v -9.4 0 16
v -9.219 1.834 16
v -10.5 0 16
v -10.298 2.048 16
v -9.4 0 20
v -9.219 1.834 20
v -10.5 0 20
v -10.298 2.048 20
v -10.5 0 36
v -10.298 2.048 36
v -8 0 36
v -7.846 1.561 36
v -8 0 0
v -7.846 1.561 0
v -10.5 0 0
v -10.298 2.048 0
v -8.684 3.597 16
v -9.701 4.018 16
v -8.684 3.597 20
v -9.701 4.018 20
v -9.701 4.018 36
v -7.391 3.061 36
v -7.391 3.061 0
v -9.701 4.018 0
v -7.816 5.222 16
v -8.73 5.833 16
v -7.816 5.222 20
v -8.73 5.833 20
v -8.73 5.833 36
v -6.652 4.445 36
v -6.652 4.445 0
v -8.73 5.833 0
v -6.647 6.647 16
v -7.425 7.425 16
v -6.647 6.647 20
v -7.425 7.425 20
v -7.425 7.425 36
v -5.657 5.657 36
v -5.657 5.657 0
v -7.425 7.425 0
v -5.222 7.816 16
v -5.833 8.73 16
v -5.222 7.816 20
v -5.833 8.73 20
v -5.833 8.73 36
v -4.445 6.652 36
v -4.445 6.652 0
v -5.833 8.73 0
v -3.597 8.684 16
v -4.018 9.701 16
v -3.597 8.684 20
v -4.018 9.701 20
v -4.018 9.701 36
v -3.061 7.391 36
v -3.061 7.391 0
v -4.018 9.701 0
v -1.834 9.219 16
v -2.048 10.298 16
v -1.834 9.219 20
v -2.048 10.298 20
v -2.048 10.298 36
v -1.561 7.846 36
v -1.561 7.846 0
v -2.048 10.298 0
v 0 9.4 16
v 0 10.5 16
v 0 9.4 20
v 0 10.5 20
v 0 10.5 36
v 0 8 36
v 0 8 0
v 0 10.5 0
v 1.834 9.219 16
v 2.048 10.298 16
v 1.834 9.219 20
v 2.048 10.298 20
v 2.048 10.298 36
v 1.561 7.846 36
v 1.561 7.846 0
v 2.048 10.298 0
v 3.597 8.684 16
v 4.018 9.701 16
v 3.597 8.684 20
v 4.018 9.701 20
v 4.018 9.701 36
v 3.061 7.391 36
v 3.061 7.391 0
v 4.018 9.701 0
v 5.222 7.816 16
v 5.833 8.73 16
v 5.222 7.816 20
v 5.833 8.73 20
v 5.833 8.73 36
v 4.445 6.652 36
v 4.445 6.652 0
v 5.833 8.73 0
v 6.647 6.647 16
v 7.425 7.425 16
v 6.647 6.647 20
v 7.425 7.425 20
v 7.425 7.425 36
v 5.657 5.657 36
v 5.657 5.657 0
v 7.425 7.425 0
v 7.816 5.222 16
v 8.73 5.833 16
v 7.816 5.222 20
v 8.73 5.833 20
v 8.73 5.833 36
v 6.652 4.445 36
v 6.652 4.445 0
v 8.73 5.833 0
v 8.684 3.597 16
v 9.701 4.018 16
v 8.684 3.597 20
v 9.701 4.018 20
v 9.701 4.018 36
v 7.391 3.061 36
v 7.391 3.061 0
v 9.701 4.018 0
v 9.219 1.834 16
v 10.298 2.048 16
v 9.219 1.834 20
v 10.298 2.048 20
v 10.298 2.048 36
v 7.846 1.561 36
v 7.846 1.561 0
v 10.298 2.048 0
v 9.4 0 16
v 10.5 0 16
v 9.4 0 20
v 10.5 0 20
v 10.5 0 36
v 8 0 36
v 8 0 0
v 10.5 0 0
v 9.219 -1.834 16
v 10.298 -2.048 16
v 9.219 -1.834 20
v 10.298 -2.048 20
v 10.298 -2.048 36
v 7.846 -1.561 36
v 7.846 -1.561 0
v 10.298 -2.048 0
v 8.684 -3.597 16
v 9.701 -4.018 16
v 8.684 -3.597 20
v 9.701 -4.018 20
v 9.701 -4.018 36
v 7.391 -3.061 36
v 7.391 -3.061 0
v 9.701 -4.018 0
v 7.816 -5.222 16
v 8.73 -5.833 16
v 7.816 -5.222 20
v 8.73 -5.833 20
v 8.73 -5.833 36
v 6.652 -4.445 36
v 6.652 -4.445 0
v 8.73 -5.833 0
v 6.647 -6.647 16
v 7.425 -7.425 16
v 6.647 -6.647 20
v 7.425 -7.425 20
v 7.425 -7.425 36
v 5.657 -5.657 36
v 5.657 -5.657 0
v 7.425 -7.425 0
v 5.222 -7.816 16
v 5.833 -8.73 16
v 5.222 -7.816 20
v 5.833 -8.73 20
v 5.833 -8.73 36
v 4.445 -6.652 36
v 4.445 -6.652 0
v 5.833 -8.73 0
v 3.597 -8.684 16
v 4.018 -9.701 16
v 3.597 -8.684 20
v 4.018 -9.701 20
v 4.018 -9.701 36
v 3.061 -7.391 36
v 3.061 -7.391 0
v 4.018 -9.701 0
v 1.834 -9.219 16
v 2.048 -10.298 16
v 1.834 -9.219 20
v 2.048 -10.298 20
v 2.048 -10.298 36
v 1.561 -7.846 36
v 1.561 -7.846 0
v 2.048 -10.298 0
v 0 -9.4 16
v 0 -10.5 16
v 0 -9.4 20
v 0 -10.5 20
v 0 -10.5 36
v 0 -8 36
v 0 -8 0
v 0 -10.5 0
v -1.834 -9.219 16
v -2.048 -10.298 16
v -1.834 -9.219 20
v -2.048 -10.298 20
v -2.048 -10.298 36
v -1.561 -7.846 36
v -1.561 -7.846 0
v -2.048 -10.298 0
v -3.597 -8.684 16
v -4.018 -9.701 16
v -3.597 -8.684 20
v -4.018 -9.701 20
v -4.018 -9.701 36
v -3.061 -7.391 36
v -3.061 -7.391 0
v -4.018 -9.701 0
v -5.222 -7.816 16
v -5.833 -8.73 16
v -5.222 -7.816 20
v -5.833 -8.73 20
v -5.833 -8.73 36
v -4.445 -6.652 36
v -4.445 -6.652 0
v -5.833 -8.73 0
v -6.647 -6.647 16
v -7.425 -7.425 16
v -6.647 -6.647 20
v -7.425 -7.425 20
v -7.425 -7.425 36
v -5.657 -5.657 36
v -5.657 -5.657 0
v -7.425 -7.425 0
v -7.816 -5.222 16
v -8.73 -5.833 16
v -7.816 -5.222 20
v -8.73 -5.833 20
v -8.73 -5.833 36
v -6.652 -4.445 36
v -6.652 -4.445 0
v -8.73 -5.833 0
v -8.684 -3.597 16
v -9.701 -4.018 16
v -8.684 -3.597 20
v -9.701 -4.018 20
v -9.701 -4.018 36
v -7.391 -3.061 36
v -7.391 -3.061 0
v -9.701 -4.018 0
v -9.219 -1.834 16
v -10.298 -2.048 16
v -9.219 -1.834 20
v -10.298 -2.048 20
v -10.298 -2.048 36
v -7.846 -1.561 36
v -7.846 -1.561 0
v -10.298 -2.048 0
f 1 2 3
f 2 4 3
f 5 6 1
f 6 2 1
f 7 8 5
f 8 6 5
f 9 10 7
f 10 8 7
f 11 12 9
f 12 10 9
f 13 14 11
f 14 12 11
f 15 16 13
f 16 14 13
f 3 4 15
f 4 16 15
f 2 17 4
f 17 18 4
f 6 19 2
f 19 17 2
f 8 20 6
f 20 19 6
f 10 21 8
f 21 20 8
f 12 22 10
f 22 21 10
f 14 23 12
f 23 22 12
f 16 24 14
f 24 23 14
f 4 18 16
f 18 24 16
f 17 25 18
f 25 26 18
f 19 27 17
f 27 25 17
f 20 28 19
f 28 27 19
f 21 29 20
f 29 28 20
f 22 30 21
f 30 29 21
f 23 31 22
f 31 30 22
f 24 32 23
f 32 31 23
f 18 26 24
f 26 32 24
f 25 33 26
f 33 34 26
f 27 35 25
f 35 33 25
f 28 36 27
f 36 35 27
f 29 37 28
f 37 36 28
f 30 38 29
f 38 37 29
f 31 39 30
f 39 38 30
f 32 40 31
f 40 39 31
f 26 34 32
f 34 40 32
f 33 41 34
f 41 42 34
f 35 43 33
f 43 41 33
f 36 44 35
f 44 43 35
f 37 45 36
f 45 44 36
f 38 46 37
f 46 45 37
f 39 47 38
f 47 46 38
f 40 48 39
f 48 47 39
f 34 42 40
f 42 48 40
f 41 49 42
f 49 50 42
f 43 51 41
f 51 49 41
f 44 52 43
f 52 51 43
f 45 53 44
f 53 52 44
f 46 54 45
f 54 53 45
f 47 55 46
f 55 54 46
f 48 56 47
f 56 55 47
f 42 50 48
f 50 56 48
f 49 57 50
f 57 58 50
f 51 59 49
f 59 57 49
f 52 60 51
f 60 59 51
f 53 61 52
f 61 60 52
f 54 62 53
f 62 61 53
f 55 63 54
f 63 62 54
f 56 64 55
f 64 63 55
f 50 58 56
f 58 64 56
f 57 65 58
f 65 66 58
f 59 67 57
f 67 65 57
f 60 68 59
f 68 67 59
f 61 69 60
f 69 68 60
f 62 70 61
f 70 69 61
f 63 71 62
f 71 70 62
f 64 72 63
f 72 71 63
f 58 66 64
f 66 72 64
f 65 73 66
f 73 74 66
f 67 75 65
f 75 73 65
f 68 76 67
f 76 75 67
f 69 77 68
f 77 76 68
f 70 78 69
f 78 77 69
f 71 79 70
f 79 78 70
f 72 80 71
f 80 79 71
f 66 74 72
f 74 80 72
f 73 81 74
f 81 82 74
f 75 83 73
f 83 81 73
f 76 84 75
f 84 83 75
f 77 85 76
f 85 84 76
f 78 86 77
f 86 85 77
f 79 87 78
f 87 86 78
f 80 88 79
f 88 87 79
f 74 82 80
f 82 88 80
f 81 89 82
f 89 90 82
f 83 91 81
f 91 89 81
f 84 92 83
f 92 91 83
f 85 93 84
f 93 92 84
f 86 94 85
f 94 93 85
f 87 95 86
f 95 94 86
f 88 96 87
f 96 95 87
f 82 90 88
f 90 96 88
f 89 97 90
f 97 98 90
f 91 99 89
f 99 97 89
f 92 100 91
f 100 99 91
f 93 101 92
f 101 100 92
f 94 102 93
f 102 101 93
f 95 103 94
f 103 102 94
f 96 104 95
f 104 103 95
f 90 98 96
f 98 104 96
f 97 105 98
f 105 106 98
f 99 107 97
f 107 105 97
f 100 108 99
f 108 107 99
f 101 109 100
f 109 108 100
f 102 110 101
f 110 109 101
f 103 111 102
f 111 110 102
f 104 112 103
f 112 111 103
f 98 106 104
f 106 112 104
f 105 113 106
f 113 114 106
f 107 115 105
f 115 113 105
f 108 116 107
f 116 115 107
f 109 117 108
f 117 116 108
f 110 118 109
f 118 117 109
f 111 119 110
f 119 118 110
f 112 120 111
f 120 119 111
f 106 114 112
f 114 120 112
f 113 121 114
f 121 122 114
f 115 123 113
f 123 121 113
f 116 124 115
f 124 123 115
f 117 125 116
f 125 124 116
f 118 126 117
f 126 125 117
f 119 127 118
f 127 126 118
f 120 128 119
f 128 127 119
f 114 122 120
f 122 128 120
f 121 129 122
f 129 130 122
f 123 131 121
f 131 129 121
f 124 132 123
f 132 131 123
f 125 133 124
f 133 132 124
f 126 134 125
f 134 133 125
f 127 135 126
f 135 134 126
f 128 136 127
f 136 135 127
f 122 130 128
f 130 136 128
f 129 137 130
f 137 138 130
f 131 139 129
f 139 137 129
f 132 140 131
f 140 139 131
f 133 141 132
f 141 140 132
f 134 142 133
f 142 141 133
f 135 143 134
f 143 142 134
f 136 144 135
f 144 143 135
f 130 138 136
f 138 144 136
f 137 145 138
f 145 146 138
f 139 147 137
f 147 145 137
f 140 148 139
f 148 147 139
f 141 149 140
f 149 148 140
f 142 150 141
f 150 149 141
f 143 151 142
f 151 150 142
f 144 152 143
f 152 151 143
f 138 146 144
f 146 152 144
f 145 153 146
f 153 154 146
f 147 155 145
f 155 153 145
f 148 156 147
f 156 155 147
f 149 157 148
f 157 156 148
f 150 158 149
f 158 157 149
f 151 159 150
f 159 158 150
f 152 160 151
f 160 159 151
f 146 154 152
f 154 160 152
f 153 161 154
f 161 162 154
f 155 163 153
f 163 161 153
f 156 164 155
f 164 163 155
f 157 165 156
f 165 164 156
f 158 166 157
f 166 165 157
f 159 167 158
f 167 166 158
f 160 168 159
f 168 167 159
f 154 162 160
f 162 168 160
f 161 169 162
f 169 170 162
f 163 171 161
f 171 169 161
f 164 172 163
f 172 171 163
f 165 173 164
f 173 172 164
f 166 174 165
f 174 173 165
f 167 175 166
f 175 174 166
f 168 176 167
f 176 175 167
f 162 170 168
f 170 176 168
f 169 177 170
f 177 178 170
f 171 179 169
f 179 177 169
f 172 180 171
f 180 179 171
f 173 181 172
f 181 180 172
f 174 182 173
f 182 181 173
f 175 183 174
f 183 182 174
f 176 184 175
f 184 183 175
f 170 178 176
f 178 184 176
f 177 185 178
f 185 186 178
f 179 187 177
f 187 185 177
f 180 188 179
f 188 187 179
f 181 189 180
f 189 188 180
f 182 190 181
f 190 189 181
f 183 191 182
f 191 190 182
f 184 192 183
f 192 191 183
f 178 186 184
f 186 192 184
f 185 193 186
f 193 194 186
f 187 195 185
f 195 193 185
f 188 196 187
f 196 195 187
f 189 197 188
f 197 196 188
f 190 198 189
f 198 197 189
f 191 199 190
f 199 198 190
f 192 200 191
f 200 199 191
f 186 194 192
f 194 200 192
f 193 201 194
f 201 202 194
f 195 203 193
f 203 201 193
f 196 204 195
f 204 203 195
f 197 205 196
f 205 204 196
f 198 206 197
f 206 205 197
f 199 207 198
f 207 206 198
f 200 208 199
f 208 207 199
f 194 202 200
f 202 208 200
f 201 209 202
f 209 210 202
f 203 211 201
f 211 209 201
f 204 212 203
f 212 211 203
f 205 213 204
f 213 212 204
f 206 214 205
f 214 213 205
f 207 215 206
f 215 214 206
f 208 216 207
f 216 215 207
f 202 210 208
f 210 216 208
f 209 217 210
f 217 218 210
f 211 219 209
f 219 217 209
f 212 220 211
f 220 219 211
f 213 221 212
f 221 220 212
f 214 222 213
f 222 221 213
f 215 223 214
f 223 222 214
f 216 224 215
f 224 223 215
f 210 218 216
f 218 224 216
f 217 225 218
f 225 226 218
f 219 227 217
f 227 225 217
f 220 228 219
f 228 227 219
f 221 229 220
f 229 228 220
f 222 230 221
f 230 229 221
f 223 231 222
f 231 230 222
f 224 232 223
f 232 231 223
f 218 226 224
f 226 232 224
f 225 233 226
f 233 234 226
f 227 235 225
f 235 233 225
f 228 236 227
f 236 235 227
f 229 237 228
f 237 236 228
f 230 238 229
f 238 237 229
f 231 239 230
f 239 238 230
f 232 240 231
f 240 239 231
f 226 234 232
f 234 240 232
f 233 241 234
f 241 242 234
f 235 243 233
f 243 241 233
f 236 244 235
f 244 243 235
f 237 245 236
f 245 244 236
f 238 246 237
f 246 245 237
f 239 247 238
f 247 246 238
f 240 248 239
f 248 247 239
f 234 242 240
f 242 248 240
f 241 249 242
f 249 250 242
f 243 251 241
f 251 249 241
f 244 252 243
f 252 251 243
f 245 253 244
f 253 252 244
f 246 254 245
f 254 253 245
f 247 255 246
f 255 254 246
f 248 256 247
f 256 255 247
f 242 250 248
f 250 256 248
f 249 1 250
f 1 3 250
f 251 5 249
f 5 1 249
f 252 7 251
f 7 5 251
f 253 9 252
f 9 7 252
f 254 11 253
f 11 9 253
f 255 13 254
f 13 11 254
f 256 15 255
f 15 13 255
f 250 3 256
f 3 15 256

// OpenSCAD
$fn = 32;

// ----------------------------------------------------------------------
// Grooved revolve: stepped, bore R8
// ----------------------------------------------------------------------

// --- parameters (mm) ---
bore_r = 8;               // bore radius
outer_r = 10.5;           // outer radius of the body
total_h = 36;             // overall height, Z
wall = 2.5;               // radial wall thickness
groove_w = 4;             // groove width
groove_d = 1.1;           // groove depth
grooves = 1;              // number of outer grooves

bbox_x = 2 * outer_r;  // full diameter
bore_d = 2 * bore_r;  // bore diameter
body_d = 2 * outer_r;  // body diameter
revolve_angle = 360;  // full turn around the Z axis

profile = [[8, 0], [10.5, 0], [10.5, 16], [9.4, 16], [9.4, 20], [10.5, 20], [10.5, 36], [8, 36]];  // primary outline, 8 points, counter clockwise

// --- the one profile operation ---
rotate_extrude(angle = revolve_angle) polygon(points = profile);
